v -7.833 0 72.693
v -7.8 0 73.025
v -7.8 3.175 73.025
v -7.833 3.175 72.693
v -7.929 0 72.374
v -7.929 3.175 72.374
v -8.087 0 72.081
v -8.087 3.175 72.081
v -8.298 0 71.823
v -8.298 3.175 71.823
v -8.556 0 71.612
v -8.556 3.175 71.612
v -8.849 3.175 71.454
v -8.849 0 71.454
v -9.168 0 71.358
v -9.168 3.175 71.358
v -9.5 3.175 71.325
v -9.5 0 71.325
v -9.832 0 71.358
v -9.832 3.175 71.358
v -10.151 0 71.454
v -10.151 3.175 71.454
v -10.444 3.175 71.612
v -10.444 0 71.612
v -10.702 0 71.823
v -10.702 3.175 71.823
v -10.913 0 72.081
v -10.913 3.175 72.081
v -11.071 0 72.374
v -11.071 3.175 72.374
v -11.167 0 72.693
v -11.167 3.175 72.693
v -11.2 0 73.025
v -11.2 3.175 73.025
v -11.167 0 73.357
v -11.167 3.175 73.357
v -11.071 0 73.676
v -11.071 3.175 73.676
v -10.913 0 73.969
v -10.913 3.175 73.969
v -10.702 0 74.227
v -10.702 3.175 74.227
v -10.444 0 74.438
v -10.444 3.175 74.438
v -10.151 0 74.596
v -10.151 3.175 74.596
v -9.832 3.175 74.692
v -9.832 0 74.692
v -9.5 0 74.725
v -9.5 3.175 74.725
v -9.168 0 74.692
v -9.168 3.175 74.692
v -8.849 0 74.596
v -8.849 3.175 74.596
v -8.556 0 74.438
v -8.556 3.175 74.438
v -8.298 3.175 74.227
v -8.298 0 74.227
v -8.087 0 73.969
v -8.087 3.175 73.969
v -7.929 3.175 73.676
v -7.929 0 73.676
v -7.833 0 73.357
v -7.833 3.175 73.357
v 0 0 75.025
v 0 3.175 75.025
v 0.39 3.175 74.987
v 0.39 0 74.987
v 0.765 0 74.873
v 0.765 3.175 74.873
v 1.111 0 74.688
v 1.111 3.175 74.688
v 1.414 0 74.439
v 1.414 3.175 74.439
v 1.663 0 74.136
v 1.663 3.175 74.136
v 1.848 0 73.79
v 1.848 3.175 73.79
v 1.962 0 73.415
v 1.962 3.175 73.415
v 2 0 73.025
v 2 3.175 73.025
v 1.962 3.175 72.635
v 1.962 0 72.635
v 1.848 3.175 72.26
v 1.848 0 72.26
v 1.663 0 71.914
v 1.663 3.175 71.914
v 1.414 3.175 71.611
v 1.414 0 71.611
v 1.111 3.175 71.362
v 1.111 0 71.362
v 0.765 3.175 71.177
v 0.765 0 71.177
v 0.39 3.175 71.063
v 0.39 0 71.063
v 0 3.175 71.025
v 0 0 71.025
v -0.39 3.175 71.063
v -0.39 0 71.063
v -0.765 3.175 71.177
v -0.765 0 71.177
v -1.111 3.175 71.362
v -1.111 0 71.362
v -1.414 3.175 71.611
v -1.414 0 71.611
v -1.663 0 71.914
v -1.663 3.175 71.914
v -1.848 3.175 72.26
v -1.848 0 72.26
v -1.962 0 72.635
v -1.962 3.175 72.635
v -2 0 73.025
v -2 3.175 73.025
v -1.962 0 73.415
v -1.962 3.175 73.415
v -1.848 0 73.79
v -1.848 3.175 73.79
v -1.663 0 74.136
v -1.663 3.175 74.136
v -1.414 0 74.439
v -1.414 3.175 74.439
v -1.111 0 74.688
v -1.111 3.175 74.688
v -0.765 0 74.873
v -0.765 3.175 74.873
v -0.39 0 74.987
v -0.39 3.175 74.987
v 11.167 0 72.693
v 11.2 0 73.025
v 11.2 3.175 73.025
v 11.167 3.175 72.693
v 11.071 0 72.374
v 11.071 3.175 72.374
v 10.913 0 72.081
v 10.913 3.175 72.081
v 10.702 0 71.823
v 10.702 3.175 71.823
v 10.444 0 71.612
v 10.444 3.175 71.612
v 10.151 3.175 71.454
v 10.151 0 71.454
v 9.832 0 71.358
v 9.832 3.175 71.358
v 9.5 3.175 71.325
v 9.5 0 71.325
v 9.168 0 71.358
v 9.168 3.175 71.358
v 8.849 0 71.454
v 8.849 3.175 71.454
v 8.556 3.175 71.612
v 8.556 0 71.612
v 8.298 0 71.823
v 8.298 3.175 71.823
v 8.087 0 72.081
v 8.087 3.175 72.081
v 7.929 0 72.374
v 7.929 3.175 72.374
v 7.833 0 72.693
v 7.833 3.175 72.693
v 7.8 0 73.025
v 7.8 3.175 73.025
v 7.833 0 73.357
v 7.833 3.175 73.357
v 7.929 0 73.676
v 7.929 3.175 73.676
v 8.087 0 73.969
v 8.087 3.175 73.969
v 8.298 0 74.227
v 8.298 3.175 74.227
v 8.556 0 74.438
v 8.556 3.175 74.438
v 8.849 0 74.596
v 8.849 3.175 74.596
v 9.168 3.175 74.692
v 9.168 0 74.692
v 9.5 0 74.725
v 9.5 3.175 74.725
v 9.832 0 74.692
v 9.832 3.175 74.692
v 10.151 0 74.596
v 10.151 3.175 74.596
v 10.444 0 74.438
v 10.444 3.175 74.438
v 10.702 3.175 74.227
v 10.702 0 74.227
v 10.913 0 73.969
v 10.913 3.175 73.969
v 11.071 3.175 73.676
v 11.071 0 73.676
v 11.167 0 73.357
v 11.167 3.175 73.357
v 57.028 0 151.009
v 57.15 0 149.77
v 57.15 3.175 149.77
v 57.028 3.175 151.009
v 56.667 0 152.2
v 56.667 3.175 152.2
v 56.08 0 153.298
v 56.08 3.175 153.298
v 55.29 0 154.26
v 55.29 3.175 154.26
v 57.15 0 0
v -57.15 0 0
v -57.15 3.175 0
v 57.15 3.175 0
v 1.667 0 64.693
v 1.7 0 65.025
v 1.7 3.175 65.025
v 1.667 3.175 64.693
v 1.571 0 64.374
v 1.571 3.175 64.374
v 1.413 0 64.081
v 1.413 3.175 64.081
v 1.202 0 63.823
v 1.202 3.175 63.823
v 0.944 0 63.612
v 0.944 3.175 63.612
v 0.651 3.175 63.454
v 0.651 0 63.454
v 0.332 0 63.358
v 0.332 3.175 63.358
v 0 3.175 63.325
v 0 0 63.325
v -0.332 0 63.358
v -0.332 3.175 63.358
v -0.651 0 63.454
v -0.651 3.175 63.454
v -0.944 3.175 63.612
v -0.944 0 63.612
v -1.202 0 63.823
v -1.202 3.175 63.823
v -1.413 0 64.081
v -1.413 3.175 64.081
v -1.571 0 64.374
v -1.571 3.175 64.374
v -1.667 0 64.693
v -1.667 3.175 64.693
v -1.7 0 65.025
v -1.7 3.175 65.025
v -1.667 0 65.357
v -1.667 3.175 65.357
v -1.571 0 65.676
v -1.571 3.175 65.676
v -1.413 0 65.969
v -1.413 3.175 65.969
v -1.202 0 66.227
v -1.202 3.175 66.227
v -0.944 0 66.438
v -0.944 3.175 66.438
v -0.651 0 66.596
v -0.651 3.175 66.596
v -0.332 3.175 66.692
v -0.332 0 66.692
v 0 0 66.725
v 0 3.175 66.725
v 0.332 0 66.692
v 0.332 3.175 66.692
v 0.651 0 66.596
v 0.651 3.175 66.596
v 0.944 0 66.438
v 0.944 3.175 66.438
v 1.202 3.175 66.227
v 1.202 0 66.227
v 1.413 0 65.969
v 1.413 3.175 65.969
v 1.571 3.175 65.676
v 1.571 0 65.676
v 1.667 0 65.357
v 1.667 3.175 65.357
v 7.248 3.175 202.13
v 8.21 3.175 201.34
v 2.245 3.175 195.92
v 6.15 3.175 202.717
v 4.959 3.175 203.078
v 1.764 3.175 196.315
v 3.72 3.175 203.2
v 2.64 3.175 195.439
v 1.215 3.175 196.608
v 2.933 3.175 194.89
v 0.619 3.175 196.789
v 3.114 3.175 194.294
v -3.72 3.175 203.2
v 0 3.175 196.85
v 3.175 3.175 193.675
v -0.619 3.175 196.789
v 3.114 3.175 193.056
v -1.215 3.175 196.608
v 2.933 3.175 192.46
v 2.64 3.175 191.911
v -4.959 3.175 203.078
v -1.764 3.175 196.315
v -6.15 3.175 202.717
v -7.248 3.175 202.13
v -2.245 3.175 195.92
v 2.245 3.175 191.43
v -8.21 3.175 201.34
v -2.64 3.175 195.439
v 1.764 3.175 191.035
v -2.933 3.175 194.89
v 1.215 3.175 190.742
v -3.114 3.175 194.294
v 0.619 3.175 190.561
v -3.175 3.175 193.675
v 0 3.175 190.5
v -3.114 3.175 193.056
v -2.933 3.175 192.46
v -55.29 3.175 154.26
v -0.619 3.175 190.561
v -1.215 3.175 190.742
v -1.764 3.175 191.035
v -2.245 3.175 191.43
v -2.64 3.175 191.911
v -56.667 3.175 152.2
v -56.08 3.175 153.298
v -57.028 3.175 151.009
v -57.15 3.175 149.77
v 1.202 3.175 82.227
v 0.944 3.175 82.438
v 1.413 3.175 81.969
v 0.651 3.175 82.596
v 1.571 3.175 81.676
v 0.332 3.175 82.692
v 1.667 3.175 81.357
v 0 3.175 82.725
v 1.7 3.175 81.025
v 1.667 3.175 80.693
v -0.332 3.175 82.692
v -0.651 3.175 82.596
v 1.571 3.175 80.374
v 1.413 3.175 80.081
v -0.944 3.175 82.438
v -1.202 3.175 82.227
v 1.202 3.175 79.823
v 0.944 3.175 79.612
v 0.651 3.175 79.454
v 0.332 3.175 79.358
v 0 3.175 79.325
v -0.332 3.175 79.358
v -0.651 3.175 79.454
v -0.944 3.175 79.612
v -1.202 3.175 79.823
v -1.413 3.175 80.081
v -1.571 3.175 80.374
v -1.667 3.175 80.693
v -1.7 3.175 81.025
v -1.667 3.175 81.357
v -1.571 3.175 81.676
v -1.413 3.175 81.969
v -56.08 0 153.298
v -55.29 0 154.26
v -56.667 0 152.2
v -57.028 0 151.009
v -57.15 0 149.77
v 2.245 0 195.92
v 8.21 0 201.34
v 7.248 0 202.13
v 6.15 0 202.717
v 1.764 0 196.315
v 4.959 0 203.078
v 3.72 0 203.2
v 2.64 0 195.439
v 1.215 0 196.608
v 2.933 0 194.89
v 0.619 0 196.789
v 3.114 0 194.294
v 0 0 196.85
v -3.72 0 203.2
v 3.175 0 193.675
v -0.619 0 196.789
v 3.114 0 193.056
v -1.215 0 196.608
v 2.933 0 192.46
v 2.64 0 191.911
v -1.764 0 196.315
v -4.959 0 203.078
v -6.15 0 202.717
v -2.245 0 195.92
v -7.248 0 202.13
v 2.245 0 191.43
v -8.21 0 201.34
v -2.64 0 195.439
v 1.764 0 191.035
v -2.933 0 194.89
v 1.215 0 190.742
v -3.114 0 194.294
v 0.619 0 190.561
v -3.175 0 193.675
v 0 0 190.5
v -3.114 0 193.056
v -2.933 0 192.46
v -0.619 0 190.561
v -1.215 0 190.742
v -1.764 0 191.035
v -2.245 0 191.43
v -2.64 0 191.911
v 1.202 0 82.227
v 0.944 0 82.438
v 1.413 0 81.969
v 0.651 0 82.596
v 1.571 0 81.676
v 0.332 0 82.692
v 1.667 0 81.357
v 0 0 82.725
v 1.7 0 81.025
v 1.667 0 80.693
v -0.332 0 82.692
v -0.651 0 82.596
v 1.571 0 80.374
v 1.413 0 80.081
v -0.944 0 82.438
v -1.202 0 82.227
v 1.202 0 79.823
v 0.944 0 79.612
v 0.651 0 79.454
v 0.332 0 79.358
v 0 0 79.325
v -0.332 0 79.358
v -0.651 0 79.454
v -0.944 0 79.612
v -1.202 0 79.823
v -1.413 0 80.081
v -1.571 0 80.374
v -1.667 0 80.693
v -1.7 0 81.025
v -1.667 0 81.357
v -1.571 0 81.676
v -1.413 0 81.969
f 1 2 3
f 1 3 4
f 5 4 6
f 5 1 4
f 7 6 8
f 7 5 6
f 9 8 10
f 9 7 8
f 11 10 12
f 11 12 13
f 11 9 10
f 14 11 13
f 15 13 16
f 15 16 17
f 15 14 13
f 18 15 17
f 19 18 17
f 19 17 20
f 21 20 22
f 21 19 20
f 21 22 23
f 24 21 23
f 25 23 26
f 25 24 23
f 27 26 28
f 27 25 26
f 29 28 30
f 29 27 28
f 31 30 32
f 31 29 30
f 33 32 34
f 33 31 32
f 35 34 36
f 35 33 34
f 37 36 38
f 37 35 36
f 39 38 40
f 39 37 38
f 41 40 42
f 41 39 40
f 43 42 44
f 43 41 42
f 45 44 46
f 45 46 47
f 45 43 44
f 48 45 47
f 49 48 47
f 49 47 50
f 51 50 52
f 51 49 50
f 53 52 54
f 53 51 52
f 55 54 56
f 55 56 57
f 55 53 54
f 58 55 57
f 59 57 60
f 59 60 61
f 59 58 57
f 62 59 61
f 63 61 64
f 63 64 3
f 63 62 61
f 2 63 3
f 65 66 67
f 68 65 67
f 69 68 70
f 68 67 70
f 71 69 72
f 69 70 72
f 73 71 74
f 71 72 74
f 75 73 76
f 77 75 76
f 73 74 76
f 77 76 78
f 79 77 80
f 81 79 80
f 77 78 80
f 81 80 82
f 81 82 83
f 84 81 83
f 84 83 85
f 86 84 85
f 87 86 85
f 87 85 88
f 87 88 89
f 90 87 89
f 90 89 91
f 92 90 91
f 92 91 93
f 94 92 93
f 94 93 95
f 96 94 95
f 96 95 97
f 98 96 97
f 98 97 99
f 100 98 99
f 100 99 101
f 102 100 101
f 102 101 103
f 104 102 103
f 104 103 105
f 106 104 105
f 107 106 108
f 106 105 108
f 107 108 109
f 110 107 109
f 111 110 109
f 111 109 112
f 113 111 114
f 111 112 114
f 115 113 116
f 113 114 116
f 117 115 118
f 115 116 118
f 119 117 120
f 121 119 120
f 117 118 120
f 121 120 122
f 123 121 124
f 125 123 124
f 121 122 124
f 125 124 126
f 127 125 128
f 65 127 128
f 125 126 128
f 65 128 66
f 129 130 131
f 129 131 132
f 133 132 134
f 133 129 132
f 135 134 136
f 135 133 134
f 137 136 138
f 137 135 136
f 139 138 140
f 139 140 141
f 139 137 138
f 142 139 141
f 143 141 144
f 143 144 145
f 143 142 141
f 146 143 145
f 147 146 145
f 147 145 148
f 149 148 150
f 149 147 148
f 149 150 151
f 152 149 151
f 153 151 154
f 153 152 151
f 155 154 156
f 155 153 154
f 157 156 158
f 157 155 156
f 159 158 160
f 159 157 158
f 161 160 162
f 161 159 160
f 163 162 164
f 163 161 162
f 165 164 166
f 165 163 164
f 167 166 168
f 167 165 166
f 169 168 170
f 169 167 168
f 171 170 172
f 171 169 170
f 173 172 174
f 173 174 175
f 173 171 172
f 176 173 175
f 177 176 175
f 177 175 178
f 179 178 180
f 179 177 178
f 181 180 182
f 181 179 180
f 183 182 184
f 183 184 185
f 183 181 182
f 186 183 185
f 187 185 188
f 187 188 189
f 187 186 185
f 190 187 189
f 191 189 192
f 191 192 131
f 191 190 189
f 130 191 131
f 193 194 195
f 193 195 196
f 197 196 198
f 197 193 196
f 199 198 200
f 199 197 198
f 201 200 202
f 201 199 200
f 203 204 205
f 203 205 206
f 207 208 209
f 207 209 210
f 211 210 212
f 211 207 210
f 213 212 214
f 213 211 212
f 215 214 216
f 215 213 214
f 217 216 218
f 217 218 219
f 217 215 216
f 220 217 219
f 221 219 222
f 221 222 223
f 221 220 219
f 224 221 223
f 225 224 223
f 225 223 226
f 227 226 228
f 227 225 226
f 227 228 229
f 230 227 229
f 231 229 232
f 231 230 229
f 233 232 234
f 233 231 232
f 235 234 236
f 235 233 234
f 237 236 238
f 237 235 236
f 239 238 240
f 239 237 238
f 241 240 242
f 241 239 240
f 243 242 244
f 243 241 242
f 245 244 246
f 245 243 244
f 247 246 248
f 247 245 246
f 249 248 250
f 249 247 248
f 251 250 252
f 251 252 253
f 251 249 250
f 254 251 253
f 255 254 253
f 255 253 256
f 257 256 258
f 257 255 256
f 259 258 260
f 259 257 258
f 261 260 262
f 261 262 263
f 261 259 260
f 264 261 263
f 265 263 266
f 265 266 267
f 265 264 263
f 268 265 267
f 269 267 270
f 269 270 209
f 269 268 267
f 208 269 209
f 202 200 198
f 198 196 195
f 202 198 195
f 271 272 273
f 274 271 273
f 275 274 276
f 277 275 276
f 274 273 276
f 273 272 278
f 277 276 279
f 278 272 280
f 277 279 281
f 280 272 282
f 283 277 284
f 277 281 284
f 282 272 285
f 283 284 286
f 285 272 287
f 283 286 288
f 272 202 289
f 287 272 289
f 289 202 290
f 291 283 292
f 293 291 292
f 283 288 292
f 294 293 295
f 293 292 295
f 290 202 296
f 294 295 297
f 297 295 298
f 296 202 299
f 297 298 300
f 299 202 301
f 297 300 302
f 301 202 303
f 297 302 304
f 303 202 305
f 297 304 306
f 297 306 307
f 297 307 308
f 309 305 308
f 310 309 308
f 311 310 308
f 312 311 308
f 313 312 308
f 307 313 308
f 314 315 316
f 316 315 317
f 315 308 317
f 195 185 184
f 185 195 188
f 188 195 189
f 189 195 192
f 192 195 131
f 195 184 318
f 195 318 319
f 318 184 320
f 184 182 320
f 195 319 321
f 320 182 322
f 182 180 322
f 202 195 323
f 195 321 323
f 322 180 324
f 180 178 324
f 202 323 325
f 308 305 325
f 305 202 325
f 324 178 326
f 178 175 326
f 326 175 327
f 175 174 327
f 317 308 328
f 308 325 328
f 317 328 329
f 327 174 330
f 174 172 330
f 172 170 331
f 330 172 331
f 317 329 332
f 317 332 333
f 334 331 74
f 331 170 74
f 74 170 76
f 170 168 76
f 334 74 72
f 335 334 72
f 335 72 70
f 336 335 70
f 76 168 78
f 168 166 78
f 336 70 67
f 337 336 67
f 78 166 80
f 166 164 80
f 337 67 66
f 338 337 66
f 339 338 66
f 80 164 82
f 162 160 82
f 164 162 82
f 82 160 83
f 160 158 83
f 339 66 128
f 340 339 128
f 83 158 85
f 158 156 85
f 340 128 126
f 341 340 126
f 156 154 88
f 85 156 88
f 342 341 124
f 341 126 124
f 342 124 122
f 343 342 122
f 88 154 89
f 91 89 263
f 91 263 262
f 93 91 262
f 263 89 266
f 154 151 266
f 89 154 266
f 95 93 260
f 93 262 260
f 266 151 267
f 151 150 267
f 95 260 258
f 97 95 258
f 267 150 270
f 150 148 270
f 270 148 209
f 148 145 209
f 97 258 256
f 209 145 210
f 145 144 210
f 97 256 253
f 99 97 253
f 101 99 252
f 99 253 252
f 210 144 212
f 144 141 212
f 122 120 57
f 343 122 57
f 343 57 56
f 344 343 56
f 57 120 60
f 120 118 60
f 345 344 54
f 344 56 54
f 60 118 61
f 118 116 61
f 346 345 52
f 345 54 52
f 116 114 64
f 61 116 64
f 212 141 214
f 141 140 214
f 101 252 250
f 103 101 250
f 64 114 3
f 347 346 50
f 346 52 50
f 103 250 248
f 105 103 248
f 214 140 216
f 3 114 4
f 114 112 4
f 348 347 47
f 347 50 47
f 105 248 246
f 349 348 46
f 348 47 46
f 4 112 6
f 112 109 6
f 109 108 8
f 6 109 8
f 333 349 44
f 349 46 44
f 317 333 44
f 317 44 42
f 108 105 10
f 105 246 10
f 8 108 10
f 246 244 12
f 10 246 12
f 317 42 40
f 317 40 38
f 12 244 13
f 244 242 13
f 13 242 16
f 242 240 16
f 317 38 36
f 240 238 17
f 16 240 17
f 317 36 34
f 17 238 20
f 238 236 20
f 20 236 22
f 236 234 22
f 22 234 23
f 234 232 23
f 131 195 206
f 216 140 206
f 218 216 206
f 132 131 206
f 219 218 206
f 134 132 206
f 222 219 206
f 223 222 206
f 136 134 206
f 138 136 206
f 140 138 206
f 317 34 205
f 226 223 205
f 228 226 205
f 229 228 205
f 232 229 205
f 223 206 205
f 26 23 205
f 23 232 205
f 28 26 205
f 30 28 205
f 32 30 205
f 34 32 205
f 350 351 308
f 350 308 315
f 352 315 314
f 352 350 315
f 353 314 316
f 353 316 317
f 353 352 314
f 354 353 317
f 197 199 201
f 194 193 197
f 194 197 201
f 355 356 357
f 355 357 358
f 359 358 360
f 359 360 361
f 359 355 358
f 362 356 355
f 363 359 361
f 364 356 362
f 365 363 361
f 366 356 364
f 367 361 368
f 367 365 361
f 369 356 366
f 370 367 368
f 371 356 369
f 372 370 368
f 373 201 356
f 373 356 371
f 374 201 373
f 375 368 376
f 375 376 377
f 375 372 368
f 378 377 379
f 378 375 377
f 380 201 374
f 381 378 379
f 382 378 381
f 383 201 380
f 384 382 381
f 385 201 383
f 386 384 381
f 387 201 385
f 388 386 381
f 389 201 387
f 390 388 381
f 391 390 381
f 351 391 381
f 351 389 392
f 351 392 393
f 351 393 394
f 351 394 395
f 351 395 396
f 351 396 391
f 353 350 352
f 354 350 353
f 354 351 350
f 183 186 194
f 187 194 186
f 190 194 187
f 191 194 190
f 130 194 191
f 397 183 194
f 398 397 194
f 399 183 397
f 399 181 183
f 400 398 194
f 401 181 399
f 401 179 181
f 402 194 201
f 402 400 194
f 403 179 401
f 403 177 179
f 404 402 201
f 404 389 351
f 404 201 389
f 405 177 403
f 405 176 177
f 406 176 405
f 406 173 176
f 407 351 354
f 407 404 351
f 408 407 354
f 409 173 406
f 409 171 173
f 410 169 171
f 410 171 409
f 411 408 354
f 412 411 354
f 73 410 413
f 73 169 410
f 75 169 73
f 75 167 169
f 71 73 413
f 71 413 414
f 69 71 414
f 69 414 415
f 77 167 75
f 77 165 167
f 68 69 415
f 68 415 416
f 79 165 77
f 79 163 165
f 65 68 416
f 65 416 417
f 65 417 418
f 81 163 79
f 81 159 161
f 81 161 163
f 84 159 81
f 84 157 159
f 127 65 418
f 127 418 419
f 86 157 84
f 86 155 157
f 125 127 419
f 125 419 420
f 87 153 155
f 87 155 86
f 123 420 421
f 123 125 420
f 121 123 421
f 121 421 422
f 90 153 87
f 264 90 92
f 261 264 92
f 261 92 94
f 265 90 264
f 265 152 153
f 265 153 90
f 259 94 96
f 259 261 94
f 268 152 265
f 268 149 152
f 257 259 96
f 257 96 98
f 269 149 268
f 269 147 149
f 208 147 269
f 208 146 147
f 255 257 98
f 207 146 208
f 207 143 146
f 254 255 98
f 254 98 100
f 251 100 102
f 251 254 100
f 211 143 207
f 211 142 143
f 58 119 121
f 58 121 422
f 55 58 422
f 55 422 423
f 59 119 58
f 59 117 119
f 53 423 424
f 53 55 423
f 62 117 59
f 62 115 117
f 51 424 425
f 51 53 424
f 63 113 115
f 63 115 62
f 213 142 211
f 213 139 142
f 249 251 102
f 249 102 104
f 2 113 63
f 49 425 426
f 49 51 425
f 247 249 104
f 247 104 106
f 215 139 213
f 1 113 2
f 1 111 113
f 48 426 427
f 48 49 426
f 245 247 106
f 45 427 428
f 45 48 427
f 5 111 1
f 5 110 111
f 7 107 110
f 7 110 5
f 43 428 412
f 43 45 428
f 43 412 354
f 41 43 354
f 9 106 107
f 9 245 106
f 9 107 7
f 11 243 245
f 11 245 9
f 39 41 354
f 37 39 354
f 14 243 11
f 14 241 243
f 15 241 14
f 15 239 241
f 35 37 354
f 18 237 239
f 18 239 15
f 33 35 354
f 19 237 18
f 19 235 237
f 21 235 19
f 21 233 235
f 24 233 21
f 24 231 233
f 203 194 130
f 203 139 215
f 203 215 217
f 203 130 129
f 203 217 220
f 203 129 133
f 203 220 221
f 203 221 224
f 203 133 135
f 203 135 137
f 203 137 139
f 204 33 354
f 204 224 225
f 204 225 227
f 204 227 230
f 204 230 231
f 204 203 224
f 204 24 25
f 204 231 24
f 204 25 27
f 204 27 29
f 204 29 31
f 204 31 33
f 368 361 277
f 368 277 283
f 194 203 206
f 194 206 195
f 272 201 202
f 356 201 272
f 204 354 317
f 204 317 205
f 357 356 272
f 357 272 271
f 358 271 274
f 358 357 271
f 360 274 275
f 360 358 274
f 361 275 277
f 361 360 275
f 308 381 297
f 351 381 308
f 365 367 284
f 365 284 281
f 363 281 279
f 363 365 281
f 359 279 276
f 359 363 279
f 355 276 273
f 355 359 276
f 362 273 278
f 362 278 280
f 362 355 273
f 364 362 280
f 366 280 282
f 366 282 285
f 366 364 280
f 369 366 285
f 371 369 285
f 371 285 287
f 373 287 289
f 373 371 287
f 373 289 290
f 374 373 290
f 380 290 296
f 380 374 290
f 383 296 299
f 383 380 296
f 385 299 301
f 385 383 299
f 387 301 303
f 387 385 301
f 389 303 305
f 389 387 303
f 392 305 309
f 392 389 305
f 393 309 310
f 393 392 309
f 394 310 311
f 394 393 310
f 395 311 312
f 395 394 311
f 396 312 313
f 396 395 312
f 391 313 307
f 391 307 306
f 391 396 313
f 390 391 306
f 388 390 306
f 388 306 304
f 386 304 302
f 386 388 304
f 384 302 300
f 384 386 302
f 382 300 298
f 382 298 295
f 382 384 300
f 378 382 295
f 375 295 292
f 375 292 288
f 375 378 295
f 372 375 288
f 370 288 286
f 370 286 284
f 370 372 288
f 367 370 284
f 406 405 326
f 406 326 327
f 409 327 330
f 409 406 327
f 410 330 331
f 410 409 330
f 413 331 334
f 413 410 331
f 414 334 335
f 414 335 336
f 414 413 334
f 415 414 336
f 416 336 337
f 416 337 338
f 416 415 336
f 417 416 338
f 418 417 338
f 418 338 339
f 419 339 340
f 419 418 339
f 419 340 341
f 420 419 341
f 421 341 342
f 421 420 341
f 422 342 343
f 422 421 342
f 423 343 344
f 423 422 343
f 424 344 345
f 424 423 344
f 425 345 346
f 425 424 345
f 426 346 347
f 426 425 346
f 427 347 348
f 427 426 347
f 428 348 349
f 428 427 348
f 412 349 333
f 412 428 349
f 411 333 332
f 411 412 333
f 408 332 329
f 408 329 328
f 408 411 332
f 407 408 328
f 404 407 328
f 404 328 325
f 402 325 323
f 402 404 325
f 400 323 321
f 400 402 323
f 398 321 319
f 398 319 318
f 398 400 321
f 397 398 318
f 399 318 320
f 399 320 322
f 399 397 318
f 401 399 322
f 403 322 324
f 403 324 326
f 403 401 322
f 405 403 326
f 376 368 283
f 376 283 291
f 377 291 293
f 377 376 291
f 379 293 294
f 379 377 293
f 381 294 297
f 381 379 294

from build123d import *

# Parameters (mm, degrees)
SKETCH1_R               = 3.175
BOSS_EXTRUDE1_DEPTH     = 3.175
CUT_EXTRUDE1_REACH      = 213.108
SKETCH2_R               = 2
ADVANCEDHOLE1_OUTLINE_R = 1.7
ADVANCEDHOLE1_DEPTH     = 3.175


# Read off the part's stored shape, not the designer's step: AdvancedHole1
with BuildPart() as part:
    # Sketch1 → Boss-Extrude1 (new body)
    with BuildSketch(Plane(origin=(0, 0, 0), x_dir=(1, 0, 0), z_dir=(0, 1, 0))):
        with BuildLine():
            Line((-57.15, 0), (57.15, 0))
            Line((57.15, 0), (57.15, -149.769743879))
            ThreePointArc((57.15, -149.769743879), (56.666635031, -152.199783674), (55.290128061, -154.259871939))
            Line((55.290128061, -154.259871939), (8.209871939, -201.340128061))
            ThreePointArc((8.209871939, -201.340128061), (6.149783674, -202.716635031), (3.719743879, -203.2))
            Line((3.719743879, -203.2), (-3.719743879, -203.2))
            ThreePointArc((-3.719743879, -203.2), (-6.149783674, -202.716635031), (-8.209871939, -201.340128061))
            Line((-8.209871939, -201.340128061), (-55.290128061, -154.259871939))
            ThreePointArc((-55.290128061, -154.259871939), (-56.666635031, -152.199783674), (-57.15, -149.769743879))
            Line((-57.15, -149.769743879), (-57.15, 0))
        make_face()
        with Locations(Location((0, -193.675, 0), (0, 0, 270))):
            Circle(SKETCH1_R, mode=Mode.SUBTRACT)
    extrude(amount=BOSS_EXTRUDE1_DEPTH)

    # Sketch2 → Cut-Extrude1 (cut, up to next)
    with BuildSketch(Plane(origin=(0, 3.175, 0), x_dir=(1, 0, 0), z_dir=(0, 1, 0)), mode=Mode.PRIVATE) as cut_extrude1_sk1:
        with Locations(Location((0, -73.025, 0), (0, 0, 270))):
            Circle(SKETCH2_R)
    cut_extrude1_tool1 = extrude(cut_extrude1_sk1.sketch, amount=-CUT_EXTRUDE1_REACH, mode=Mode.PRIVATE) & part.part
    add(cut_extrude1_tool1.solids().sort_by_distance((0, 3.175, 73.025))[0], mode=Mode.SUBTRACT)

    # AdvancedHole1 outline → AdvancedHole1 (cut)
    with BuildSketch(Plane(origin=(0, 0, 0), x_dir=(1, 0, 0), z_dir=(0, 1, 0))):
        with Locations((9.5, -73.025)):
            Circle(ADVANCEDHOLE1_OUTLINE_R)
        with Locations((0, -81.025)):
            Circle(ADVANCEDHOLE1_OUTLINE_R)
        with Locations((-9.5, -73.025)):
            Circle(ADVANCEDHOLE1_OUTLINE_R)
        with Locations((0, -65.025)):
            Circle(ADVANCEDHOLE1_OUTLINE_R)
    extrude(amount=ADVANCEDHOLE1_DEPTH, mode=Mode.SUBTRACT)


solid = part.part
